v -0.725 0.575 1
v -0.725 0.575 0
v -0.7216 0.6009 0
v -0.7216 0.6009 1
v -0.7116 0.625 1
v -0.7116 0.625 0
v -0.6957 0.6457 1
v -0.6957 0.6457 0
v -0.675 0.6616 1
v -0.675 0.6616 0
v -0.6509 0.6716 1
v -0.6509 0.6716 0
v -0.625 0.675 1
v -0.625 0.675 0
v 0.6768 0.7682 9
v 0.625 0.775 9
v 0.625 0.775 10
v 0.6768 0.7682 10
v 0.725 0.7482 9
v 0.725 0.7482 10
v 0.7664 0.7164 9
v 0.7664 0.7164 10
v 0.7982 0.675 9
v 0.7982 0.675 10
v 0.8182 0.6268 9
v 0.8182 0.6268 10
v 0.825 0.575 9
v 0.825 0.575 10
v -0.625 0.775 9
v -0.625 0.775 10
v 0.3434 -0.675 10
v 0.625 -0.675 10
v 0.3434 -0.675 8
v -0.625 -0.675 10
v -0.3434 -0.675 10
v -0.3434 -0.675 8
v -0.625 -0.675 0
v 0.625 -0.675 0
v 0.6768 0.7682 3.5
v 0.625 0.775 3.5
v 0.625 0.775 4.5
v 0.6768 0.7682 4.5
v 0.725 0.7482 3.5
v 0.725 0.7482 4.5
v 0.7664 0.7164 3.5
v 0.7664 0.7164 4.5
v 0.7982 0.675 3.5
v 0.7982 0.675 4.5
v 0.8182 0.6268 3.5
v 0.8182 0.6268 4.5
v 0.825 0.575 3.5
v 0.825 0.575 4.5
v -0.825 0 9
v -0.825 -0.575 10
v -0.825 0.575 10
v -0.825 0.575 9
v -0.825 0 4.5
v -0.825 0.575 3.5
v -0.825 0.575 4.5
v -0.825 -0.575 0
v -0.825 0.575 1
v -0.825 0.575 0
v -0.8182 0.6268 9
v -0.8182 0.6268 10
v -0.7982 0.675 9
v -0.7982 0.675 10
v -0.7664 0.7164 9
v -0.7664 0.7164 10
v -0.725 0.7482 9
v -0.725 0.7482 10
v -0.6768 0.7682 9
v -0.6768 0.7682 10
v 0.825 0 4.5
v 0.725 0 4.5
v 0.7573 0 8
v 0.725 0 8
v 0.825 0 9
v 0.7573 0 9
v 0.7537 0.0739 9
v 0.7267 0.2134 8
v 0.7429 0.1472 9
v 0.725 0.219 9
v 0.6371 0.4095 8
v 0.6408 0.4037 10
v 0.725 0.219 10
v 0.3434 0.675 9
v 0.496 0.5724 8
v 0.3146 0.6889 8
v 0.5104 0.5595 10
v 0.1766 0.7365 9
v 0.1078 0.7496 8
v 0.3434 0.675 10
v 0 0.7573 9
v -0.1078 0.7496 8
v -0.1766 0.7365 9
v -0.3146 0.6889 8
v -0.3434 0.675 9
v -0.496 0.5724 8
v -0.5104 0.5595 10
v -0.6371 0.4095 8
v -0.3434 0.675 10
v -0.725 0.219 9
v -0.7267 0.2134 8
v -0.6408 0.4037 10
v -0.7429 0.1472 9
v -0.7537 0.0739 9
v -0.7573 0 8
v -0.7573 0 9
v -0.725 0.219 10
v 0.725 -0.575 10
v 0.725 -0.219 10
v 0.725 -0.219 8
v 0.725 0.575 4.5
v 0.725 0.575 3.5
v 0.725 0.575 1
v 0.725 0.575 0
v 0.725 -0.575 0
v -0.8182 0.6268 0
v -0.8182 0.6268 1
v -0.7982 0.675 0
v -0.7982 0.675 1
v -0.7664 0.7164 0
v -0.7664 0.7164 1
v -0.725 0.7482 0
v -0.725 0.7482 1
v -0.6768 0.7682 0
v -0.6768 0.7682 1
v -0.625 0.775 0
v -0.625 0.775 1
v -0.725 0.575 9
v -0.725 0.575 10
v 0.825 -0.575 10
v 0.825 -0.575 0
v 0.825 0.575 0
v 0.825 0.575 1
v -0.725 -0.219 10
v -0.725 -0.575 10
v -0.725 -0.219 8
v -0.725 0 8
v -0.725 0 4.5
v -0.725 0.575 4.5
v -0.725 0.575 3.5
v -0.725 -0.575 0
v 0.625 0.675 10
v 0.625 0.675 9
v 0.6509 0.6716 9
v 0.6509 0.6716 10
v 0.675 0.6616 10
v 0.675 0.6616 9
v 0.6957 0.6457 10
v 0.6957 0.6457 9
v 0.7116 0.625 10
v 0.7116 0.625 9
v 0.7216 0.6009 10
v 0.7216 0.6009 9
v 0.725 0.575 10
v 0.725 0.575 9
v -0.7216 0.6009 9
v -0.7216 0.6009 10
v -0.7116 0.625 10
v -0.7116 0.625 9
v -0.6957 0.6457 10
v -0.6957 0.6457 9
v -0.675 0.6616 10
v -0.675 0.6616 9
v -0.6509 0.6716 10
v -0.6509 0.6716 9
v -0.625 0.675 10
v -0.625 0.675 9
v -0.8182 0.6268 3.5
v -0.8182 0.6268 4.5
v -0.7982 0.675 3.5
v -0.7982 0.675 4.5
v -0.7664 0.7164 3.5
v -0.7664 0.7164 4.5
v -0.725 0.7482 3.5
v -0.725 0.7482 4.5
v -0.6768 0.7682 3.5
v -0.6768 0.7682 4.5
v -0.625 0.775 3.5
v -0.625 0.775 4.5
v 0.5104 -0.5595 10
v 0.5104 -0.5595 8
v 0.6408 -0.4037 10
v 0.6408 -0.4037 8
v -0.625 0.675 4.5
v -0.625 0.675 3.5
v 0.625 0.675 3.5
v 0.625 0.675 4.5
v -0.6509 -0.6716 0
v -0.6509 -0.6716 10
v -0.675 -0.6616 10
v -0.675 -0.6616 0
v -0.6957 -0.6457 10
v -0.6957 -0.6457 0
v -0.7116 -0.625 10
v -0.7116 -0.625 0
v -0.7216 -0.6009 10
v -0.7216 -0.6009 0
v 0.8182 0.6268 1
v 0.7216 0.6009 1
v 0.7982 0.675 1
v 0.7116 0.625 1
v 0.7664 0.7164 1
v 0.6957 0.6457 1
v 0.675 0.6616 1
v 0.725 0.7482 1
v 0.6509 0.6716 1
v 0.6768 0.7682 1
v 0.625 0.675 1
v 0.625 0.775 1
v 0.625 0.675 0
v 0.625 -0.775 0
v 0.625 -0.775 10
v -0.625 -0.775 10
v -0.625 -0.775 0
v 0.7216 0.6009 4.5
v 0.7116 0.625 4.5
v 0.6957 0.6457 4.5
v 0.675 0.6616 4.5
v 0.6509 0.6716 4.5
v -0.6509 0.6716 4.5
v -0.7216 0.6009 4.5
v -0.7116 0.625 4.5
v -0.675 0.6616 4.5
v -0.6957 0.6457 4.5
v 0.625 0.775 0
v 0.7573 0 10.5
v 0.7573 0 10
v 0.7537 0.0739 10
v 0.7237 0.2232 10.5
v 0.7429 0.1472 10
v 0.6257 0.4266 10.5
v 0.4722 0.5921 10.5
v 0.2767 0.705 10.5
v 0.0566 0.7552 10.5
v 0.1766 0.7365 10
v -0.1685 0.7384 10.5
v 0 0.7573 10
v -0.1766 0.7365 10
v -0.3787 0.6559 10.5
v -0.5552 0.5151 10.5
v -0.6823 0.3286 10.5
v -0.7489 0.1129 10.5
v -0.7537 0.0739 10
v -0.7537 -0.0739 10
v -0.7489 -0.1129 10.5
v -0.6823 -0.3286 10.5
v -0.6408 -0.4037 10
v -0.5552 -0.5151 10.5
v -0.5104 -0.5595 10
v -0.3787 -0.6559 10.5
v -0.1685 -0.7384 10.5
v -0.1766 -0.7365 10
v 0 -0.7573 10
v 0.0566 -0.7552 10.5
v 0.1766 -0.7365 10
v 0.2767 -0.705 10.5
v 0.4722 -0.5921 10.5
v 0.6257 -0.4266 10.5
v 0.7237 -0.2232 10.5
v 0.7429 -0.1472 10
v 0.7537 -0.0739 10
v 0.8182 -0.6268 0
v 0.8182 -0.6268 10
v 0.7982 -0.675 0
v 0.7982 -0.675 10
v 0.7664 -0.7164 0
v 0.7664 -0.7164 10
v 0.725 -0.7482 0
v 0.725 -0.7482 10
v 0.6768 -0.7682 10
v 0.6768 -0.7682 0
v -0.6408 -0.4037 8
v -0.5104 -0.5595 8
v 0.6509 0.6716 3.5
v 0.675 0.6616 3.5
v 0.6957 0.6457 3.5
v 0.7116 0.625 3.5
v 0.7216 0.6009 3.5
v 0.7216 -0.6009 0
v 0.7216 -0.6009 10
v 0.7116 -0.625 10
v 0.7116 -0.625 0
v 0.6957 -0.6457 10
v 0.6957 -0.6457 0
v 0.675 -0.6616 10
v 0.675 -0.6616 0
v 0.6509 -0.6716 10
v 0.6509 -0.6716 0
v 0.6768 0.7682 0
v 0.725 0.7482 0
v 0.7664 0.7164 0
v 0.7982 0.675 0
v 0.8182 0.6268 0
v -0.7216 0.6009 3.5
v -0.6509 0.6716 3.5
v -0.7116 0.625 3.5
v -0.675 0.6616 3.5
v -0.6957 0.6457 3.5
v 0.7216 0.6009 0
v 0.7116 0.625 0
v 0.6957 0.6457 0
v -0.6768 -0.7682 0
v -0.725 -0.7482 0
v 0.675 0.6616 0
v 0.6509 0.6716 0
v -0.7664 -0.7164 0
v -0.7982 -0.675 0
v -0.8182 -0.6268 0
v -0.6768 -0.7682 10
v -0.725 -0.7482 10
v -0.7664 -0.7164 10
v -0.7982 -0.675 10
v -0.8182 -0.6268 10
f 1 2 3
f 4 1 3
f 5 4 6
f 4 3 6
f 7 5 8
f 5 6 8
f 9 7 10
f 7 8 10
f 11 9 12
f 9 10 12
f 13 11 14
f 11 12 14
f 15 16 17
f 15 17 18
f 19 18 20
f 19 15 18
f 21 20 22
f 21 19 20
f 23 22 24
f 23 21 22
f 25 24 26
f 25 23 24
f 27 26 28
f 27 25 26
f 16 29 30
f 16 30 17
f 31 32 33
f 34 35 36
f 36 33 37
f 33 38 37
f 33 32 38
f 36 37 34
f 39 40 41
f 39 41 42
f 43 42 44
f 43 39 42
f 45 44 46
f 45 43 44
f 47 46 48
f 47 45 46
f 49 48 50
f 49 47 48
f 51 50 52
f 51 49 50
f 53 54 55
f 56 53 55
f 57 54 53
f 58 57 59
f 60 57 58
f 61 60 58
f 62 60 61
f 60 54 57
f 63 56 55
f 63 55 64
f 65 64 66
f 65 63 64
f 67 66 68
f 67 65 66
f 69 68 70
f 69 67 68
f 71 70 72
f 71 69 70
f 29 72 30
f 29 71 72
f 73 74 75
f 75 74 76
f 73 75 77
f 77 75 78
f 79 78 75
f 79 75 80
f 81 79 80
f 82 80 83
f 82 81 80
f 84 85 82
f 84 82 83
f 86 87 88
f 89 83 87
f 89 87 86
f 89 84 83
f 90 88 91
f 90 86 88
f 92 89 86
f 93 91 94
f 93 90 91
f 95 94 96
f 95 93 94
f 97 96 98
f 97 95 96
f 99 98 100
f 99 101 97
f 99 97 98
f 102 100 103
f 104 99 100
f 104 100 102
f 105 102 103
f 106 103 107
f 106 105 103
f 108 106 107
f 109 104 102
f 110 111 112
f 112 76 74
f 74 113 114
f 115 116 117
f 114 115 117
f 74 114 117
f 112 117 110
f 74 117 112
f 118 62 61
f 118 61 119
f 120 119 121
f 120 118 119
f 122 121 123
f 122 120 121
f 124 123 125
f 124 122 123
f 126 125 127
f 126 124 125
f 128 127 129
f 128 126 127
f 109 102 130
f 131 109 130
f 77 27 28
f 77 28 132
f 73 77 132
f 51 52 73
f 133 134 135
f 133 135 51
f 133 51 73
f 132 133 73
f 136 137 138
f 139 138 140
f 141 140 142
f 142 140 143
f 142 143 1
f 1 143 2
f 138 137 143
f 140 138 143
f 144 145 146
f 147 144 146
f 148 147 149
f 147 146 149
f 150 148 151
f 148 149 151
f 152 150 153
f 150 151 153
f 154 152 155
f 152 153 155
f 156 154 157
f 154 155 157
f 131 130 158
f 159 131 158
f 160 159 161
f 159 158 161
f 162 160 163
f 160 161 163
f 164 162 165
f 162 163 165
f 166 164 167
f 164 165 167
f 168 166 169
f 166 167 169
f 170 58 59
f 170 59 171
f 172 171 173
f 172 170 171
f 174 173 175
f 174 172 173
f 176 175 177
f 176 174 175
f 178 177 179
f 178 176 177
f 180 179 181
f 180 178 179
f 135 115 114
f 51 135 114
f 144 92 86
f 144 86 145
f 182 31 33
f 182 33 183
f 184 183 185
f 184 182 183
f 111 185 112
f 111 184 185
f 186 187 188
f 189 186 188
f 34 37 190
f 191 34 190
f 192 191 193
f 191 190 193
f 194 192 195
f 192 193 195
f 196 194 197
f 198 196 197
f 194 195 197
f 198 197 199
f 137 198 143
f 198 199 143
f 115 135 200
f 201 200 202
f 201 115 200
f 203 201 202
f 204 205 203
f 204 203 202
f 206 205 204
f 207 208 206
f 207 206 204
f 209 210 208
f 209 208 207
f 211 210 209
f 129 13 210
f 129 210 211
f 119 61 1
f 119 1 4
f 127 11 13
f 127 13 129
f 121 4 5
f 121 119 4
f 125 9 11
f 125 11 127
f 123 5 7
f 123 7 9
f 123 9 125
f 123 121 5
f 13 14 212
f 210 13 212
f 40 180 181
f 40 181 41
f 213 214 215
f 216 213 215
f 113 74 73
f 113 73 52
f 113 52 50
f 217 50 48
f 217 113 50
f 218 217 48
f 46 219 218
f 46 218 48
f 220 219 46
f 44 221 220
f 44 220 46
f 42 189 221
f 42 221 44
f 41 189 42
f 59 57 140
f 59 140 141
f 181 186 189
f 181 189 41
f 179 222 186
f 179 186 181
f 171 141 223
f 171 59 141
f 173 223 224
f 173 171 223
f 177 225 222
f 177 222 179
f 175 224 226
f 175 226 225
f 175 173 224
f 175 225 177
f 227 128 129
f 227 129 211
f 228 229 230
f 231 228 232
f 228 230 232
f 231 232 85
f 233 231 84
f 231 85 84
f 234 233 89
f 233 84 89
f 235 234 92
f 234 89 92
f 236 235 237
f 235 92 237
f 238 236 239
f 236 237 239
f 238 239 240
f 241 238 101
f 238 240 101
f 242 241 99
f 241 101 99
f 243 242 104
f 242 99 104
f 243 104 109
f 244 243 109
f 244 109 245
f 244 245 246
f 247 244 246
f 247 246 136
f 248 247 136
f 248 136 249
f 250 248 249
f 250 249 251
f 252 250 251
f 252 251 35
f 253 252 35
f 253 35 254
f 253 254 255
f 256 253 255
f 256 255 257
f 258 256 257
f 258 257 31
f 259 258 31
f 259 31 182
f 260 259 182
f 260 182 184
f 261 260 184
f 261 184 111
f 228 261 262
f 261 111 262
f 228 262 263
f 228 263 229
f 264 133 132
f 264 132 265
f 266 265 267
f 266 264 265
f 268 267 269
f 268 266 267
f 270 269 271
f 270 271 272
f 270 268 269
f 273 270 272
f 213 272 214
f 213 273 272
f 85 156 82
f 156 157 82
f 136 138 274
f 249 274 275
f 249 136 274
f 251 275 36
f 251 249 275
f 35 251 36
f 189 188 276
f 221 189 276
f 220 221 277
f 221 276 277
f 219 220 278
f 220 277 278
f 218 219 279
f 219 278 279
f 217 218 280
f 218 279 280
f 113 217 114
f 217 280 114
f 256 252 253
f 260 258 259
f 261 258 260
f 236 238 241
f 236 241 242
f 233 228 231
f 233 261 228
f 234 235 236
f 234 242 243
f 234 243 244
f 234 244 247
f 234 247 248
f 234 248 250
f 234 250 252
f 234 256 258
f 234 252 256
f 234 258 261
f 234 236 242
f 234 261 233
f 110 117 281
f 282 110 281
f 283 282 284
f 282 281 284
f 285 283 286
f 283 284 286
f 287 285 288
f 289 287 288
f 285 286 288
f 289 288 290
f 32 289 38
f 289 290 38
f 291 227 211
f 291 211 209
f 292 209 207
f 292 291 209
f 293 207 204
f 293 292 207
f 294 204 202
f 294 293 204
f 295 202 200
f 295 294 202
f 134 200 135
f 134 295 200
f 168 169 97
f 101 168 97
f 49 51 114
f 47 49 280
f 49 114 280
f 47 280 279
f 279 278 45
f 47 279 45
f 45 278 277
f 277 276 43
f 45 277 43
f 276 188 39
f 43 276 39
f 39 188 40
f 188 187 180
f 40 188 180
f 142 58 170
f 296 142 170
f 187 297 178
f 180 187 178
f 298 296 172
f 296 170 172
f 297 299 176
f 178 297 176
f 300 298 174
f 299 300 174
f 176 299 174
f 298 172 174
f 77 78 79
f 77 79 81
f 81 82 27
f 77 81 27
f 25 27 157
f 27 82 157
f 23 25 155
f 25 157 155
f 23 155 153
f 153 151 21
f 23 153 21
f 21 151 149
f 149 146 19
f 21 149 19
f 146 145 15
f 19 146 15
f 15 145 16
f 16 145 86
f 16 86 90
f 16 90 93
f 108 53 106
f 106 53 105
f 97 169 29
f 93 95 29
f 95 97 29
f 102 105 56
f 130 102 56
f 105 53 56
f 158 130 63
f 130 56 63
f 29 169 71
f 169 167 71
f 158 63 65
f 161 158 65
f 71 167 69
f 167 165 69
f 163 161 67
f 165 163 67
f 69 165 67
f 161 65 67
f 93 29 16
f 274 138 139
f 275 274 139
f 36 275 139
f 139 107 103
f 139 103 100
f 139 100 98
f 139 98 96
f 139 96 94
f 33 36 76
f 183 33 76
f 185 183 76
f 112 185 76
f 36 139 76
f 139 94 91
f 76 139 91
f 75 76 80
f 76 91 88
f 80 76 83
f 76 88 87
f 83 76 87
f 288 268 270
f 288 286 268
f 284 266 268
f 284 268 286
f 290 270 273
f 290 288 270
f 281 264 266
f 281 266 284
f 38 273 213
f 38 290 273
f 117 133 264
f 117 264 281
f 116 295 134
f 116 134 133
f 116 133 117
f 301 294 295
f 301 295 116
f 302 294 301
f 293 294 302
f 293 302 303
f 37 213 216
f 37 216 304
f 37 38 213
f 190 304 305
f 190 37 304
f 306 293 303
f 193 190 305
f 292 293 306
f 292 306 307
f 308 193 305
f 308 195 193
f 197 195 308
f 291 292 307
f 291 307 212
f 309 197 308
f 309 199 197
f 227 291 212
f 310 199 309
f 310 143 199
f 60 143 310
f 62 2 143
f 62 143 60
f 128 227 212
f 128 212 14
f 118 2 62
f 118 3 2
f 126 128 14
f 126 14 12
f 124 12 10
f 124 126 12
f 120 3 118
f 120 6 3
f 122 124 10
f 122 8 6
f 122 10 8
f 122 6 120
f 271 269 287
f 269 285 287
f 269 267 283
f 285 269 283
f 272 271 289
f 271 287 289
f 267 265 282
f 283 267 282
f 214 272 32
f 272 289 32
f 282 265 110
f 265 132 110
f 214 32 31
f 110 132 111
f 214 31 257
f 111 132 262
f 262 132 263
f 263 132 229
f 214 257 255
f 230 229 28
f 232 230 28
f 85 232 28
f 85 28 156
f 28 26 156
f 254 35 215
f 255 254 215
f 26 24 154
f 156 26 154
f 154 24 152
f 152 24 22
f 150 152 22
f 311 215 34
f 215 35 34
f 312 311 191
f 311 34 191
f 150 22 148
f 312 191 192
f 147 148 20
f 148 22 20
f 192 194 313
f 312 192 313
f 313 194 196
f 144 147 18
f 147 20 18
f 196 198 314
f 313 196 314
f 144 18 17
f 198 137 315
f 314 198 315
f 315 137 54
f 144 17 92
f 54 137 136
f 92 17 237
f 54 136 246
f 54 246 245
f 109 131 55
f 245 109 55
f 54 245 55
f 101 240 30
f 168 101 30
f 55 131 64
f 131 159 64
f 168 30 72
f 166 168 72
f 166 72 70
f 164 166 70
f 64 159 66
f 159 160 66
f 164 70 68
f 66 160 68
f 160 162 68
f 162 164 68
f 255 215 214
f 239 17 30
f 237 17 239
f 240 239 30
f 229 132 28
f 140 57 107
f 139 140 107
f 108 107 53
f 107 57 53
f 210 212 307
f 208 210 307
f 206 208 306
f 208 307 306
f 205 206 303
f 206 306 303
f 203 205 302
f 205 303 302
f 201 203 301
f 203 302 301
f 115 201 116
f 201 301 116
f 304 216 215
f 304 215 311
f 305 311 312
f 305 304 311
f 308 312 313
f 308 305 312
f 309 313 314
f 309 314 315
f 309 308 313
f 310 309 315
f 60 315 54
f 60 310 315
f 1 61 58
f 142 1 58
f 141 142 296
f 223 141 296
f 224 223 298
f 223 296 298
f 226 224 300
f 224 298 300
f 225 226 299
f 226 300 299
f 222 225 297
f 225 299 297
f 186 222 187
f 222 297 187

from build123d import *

# Parameters (mm, degrees)
BODY_DEPTH         = 10
SKETCH2_W          = 2.5
SKETCH2_H          = 0.2
SKETCH2_W_2        = 4.5
SKETCH2_H_2        = 0.775
CUT_EXTRUDE1_DEPTH = 1.65
SKETCH3_R          = 0.757347034
WIRE_2_DEPTH       = 0.5
WIRE_2_DEPTH_BACK  = 2


with BuildPart() as part:
    # Sketch1 → Body (new body)
    with BuildSketch(Plane.XY):
        with BuildLine():
            Line((0.625, -0.775), (-0.625, -0.775))
            ThreePointArc((-0.625, -0.775), (-0.766421356, -0.716421356), (-0.825, -0.575))
            Line((-0.825, -0.575), (-0.825, 0.575))
            ThreePointArc((-0.825, 0.575), (-0.766421356, 0.716421356), (-0.625, 0.775))
            Line((-0.625, 0.775), (0.625, 0.775))
            ThreePointArc((0.625, 0.775), (0.766421356, 0.716421356), (0.825, 0.575))
            Line((0.825, 0.575), (0.825, -0.575))
            ThreePointArc((0.825, -0.575), (0.766421356, -0.716421356), (0.625, -0.775))
        make_face()
        with BuildLine():
            Line((-0.725, -0.575), (-0.725, 0.575))
            ThreePointArc((-0.725, 0.575), (-0.695710678, 0.645710678), (-0.625, 0.675))
            Line((-0.625, 0.675), (0.625, 0.675))
            ThreePointArc((0.625, 0.675), (0.695710678, 0.645710678), (0.725, 0.575))
            Line((0.725, 0.575), (0.725, -0.575))
            ThreePointArc((0.725, -0.575), (0.695710678, -0.645710678), (0.625, -0.675))
            Line((0.625, -0.675), (-0.625, -0.675))
            ThreePointArc((-0.625, -0.675), (-0.695710678, -0.645710678), (-0.725, -0.575))
        make_face(mode=Mode.SUBTRACT)
    extrude(amount=BODY_DEPTH)

    # Sketch2 → Cut-Extrude1 (cut)
    with BuildSketch(Plane.ZY.offset(0.825)):
        with Locations((2.25, 0.675)):
            Rectangle(SKETCH2_W, SKETCH2_H)
        with Locations((6.75, 0.3875)):
            Rectangle(SKETCH2_W_2, SKETCH2_H_2)
    extrude(amount=-CUT_EXTRUDE1_DEPTH, mode=Mode.SUBTRACT)

    # Sketch3 → Wire 2 (add, two sides)
    with BuildSketch(Plane.XY.offset(10)) as wire_2_sk:
        Circle(SKETCH3_R)
    extrude(amount=WIRE_2_DEPTH)
    extrude(wire_2_sk.sketch, amount=-WIRE_2_DEPTH_BACK)


solid = part.part
